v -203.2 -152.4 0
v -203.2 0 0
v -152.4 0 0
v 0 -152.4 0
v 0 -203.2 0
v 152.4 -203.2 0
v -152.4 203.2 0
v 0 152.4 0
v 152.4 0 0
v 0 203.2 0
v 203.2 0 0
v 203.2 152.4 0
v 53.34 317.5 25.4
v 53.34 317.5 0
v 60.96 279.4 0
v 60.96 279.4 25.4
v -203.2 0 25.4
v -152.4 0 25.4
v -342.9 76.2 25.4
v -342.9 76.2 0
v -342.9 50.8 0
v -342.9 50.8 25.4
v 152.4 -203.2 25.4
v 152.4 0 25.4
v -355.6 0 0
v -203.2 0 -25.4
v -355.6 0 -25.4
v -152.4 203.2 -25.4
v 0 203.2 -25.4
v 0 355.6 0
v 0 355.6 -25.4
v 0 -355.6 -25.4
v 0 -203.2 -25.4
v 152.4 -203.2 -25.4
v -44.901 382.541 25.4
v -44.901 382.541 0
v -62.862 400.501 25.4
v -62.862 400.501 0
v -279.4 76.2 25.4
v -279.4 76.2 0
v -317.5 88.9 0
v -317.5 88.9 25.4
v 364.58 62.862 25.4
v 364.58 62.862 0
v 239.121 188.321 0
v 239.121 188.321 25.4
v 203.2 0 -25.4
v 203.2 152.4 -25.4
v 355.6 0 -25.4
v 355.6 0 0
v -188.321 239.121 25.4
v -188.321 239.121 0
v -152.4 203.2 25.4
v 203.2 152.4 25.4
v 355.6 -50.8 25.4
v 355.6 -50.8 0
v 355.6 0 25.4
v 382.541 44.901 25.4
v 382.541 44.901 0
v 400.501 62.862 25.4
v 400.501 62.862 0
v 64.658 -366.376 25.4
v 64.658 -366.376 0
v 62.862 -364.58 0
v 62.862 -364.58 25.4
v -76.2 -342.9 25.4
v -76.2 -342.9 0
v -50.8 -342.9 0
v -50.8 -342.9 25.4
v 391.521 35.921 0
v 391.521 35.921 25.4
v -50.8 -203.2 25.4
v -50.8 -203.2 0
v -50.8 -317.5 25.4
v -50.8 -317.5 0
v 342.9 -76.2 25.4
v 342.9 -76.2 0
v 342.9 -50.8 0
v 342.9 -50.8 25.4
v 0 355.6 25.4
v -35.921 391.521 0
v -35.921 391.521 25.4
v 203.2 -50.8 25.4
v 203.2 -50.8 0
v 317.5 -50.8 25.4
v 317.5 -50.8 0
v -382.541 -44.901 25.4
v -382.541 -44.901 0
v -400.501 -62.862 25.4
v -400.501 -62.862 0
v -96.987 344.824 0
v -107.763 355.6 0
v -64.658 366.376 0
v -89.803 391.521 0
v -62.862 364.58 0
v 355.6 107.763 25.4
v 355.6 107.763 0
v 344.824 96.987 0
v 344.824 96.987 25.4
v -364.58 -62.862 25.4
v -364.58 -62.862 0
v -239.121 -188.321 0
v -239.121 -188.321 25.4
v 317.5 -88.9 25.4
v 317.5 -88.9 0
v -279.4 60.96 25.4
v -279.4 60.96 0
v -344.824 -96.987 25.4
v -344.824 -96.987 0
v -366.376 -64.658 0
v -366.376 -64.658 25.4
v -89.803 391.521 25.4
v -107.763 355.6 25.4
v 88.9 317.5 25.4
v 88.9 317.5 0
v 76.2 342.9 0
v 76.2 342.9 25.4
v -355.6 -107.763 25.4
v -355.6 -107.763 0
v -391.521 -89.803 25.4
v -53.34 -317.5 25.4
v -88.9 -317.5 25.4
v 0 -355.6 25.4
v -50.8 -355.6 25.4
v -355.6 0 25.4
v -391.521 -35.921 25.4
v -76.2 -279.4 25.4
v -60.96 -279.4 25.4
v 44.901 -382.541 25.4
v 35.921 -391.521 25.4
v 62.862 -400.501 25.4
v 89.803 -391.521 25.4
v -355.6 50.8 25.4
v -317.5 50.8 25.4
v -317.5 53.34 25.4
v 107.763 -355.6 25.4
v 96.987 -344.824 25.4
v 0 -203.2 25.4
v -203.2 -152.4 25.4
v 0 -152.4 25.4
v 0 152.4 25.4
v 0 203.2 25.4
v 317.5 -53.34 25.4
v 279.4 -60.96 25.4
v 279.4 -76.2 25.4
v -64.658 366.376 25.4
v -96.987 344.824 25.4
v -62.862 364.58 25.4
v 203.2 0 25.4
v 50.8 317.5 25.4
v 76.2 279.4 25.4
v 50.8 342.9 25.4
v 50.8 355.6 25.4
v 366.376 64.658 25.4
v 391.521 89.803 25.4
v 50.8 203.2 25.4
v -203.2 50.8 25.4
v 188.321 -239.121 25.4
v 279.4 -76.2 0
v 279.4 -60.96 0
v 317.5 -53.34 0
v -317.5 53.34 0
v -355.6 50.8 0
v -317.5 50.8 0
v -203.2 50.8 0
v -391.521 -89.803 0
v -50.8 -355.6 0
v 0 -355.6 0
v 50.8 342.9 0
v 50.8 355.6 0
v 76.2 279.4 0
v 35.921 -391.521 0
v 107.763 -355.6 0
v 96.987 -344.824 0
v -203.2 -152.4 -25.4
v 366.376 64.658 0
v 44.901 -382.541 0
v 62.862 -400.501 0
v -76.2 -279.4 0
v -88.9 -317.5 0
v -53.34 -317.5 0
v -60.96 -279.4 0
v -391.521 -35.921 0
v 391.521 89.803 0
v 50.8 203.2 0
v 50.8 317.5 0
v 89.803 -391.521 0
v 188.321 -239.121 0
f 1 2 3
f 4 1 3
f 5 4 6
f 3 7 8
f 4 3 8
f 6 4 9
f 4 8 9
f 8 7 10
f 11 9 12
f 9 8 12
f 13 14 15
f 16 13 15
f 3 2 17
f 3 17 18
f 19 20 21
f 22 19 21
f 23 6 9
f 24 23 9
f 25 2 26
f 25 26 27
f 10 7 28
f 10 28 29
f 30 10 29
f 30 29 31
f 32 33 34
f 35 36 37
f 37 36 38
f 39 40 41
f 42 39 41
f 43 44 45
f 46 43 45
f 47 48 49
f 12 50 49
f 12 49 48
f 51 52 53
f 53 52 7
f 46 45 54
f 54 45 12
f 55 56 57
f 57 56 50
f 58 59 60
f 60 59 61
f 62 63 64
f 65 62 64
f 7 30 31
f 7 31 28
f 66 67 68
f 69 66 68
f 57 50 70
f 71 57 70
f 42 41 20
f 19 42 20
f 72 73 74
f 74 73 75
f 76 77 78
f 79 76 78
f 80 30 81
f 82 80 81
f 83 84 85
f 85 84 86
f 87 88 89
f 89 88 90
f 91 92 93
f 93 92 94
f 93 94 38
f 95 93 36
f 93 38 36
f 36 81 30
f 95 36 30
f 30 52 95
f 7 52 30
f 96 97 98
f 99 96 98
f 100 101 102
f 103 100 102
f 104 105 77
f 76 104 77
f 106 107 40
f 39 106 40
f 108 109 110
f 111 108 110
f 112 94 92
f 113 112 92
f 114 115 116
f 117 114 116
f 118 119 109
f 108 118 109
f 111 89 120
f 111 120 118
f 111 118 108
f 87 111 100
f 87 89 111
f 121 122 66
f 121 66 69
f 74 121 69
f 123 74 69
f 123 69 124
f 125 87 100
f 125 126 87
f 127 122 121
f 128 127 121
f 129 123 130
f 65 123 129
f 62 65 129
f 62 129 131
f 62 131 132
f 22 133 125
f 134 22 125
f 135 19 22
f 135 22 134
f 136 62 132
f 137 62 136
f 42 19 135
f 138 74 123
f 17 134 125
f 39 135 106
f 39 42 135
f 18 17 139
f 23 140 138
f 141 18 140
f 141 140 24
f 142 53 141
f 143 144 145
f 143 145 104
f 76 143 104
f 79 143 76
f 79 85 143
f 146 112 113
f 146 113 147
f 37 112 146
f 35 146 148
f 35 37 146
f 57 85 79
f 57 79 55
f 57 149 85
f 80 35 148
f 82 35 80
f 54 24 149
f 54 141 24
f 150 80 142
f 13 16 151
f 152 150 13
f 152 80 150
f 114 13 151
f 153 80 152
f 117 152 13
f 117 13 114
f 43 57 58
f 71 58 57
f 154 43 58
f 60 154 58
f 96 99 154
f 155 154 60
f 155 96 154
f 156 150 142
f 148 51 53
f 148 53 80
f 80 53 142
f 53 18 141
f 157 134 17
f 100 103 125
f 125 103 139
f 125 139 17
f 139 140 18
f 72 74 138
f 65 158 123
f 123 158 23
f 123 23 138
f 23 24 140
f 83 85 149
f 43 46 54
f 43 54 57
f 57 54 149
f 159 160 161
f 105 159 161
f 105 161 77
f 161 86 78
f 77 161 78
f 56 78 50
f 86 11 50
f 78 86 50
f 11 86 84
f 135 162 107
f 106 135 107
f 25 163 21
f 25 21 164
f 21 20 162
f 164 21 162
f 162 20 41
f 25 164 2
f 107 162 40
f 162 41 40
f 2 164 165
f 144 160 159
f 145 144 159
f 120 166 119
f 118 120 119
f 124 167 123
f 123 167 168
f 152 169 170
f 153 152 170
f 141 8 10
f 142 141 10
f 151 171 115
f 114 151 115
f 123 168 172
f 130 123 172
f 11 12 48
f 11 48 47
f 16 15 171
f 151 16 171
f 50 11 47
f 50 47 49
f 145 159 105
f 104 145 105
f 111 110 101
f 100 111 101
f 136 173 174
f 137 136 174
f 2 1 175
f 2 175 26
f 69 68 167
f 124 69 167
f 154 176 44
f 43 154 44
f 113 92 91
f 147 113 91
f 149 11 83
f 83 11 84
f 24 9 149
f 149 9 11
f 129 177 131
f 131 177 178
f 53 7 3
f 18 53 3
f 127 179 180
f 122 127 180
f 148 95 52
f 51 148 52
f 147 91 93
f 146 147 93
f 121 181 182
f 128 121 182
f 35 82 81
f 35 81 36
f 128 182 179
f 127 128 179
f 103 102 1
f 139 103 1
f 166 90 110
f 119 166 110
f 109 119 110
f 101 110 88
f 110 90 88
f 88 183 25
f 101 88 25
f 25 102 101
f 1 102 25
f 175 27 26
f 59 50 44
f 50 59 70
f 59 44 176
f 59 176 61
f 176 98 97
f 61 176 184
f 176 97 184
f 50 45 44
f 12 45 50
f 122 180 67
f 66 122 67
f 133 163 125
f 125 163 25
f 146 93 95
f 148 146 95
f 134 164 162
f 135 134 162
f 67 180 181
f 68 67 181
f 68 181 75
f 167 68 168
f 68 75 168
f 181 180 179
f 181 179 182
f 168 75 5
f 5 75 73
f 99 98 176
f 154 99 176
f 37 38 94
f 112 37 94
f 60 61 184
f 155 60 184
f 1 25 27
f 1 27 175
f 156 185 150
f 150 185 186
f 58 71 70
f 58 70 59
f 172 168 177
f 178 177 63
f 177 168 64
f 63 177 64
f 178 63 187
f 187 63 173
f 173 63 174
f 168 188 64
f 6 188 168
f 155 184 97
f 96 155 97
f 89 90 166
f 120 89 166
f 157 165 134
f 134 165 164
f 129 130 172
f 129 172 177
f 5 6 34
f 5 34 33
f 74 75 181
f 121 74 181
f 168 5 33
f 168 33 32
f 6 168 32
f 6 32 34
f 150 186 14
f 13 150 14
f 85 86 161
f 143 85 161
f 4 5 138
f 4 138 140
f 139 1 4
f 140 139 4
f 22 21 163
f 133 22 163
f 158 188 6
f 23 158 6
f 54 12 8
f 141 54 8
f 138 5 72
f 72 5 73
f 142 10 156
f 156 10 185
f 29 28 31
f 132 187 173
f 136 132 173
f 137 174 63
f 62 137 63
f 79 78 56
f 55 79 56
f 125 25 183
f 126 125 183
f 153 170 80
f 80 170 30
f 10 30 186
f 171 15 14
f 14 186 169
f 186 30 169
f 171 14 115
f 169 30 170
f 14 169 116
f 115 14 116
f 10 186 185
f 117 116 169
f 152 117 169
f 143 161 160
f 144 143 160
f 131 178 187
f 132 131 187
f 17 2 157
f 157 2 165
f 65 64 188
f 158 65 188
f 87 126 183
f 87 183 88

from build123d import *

# Parameters (mm, degrees)
F0_W     = 152.4
F0_H     = 152.4
F0_W_2   = 50.8
F0_H_2   = 50.8
F1_DEPTH = 25.4
F2_DEPTH = 25.4


with BuildPart() as f1:
    # F0 (on Top) → F1 (new body)
    with BuildSketch(Plane.XY):
        with Locations((-76.2, -76.2)):
            Rectangle(F0_W, F0_H)
        with Locations((-76.2, 76.2)):
            Rectangle(F0_W, F0_H)
        with Locations((76.2, -76.2)):
            Rectangle(F0_W, F0_H)
        with Locations((76.2, 76.2)):
            Rectangle(F0_W, F0_H)
        with Locations((-177.8, -76.2)):
            Rectangle(F0_W_2, F0_H)
        with Locations((-76.2, 177.8)):
            Rectangle(F0_W, F0_H_2)
        with Locations((76.2, -177.8)):
            Rectangle(F0_W, F0_H_2)
        with Locations((177.8, 76.2)):
            Rectangle(F0_W_2, F0_H)
        Polygon((-355.6, 0), (-203.2, 0), (-203.2, 50.8), (-317.5, 50.8), (-342.9, 50.8), (-355.6, 50.8), align=None)
        Polygon((-203.2, -152.4), (-203.2, 0), (-355.6, 0), align=None)
        Polygon((-152.4, 203.2), (0, 203.2), (0, 355.6), align=None)
        Polygon((0, 355.6), (0, 203.2), (50.8, 203.2), (50.8, 317.5), (50.8, 342.9), (50.8, 355.6), align=None)
        Polygon((0, -355.6), (0, -203.2), (-50.8, -203.2), (-50.8, -317.5), (-50.8, -342.9), (-50.8, -355.6), align=None)
        Polygon((152.4, -203.2), (0, -203.2), (0, -355.6), align=None)
        Polygon((355.6, 0), (203.2, 0), (203.2, -50.8), (317.5, -50.8), (342.9, -50.8), (355.6, -50.8), align=None)
        Polygon((203.2, 152.4), (203.2, 0), (355.6, 0), align=None)
        Polygon((-188.3210244843, 239.1210244843), (-152.4, 203.2), (0, 355.6), (-35.9210244843, 391.5210244843), (-44.9012806053, 382.5407683632), (-62.8617928475, 364.5802561211), align=None)
        Polygon((-203.2, -152.4), (-355.6, 0), (-391.5210244843, -35.9210244843), (-382.5407683632, -44.9012806053), (-364.5802561211, -62.8617928475), (-239.1210244843, -188.3210244843), align=None)
        Polygon((239.1210244843, 188.3210244843), (203.2, 152.4), (355.6, 0), (391.5210244843, 35.9210244843), (382.5407683632, 44.9012806053), (364.5802561211, 62.8617928475), align=None)
        Polygon((152.4, -203.2), (0, -355.6), (35.9210244843, -391.5210244843), (44.9012806053, -382.5407683632), (62.8617928475, -364.5802561211), (188.3210244843, -239.1210244843), align=None)
        Polygon((-342.9, 50.8), (-317.5, 50.8), (-317.5, 53.34), (-279.4, 60.96), (-279.4, 76.2), (-317.5, 88.9), (-342.9, 76.2), align=None)
        Polygon((50.8, 342.9), (50.8, 317.5), (53.34, 317.5), (60.96, 279.4), (76.2, 279.4), (88.9, 317.5), (76.2, 342.9), align=None)
        Polygon((-50.8, -342.9), (-50.8, -317.5), (-53.34, -317.5), (-60.96, -279.4), (-76.2, -279.4), (-88.9, -317.5), (-76.2, -342.9), align=None)
        Polygon((342.9, -50.8), (317.5, -50.8), (317.5, -53.34), (279.4, -60.96), (279.4, -76.2), (317.5, -88.9), (342.9, -76.2), align=None)
        Polygon((-64.6578440717, 366.3763073453), (-62.8617928475, 364.5802561211), (-44.9012806053, 382.5407683632), (-62.8617928475, 400.5012806053), (-89.8025612107, 391.5210244843), align=None)
        Polygon((-364.5802561211, -62.8617928475), (-382.5407683632, -44.9012806053), (-400.5012806053, -62.8617928475), (-391.5210244843, -89.8025612107), (-366.3763073453, -64.6578440717), align=None)
        Polygon((366.3763073453, 64.6578440717), (364.5802561211, 62.8617928475), (382.5407683632, 44.9012806053), (400.5012806053, 62.8617928475), (391.5210244843, 89.8025612107), align=None)
        Polygon((62.8617928475, -364.5802561211), (44.9012806053, -382.5407683632), (62.8617928475, -400.5012806053), (89.8025612107, -391.5210244843), (64.6578440717, -366.3763073453), align=None)
        Polygon((-96.9867661075, 344.8236926547), (-64.6578440717, 366.3763073453), (-89.8025612107, 391.5210244843), (-107.7630734528, 355.6), align=None)
        Polygon((-344.8236926547, -96.9867661075), (-366.3763073453, -64.6578440717), (-391.5210244843, -89.8025612107), (-355.6, -107.7630734528), align=None)
        Polygon((344.8236926547, 96.9867661075), (366.3763073453, 64.6578440717), (391.5210244843, 89.8025612107), (355.6, 107.7630734528), align=None)
        Polygon((96.9867661075, -344.8236926547), (64.6578440717, -366.3763073453), (89.8025612107, -391.5210244843), (107.7630734528, -355.6), align=None)
    extrude(amount=F1_DEPTH)

    # F0 (on Top) → F2 (join)
    with BuildSketch(Plane.XY):
        Polygon((203.2, 152.4), (203.2, 0), (355.6, 0), align=None)
        Polygon((-152.4, 203.2), (0, 203.2), (0, 355.6), align=None)
        Polygon((-203.2, -152.4), (-203.2, 0), (-355.6, 0), align=None)
        Polygon((152.4, -203.2), (0, -203.2), (0, -355.6), align=None)
    extrude(amount=-F2_DEPTH)


solid = f1.part
